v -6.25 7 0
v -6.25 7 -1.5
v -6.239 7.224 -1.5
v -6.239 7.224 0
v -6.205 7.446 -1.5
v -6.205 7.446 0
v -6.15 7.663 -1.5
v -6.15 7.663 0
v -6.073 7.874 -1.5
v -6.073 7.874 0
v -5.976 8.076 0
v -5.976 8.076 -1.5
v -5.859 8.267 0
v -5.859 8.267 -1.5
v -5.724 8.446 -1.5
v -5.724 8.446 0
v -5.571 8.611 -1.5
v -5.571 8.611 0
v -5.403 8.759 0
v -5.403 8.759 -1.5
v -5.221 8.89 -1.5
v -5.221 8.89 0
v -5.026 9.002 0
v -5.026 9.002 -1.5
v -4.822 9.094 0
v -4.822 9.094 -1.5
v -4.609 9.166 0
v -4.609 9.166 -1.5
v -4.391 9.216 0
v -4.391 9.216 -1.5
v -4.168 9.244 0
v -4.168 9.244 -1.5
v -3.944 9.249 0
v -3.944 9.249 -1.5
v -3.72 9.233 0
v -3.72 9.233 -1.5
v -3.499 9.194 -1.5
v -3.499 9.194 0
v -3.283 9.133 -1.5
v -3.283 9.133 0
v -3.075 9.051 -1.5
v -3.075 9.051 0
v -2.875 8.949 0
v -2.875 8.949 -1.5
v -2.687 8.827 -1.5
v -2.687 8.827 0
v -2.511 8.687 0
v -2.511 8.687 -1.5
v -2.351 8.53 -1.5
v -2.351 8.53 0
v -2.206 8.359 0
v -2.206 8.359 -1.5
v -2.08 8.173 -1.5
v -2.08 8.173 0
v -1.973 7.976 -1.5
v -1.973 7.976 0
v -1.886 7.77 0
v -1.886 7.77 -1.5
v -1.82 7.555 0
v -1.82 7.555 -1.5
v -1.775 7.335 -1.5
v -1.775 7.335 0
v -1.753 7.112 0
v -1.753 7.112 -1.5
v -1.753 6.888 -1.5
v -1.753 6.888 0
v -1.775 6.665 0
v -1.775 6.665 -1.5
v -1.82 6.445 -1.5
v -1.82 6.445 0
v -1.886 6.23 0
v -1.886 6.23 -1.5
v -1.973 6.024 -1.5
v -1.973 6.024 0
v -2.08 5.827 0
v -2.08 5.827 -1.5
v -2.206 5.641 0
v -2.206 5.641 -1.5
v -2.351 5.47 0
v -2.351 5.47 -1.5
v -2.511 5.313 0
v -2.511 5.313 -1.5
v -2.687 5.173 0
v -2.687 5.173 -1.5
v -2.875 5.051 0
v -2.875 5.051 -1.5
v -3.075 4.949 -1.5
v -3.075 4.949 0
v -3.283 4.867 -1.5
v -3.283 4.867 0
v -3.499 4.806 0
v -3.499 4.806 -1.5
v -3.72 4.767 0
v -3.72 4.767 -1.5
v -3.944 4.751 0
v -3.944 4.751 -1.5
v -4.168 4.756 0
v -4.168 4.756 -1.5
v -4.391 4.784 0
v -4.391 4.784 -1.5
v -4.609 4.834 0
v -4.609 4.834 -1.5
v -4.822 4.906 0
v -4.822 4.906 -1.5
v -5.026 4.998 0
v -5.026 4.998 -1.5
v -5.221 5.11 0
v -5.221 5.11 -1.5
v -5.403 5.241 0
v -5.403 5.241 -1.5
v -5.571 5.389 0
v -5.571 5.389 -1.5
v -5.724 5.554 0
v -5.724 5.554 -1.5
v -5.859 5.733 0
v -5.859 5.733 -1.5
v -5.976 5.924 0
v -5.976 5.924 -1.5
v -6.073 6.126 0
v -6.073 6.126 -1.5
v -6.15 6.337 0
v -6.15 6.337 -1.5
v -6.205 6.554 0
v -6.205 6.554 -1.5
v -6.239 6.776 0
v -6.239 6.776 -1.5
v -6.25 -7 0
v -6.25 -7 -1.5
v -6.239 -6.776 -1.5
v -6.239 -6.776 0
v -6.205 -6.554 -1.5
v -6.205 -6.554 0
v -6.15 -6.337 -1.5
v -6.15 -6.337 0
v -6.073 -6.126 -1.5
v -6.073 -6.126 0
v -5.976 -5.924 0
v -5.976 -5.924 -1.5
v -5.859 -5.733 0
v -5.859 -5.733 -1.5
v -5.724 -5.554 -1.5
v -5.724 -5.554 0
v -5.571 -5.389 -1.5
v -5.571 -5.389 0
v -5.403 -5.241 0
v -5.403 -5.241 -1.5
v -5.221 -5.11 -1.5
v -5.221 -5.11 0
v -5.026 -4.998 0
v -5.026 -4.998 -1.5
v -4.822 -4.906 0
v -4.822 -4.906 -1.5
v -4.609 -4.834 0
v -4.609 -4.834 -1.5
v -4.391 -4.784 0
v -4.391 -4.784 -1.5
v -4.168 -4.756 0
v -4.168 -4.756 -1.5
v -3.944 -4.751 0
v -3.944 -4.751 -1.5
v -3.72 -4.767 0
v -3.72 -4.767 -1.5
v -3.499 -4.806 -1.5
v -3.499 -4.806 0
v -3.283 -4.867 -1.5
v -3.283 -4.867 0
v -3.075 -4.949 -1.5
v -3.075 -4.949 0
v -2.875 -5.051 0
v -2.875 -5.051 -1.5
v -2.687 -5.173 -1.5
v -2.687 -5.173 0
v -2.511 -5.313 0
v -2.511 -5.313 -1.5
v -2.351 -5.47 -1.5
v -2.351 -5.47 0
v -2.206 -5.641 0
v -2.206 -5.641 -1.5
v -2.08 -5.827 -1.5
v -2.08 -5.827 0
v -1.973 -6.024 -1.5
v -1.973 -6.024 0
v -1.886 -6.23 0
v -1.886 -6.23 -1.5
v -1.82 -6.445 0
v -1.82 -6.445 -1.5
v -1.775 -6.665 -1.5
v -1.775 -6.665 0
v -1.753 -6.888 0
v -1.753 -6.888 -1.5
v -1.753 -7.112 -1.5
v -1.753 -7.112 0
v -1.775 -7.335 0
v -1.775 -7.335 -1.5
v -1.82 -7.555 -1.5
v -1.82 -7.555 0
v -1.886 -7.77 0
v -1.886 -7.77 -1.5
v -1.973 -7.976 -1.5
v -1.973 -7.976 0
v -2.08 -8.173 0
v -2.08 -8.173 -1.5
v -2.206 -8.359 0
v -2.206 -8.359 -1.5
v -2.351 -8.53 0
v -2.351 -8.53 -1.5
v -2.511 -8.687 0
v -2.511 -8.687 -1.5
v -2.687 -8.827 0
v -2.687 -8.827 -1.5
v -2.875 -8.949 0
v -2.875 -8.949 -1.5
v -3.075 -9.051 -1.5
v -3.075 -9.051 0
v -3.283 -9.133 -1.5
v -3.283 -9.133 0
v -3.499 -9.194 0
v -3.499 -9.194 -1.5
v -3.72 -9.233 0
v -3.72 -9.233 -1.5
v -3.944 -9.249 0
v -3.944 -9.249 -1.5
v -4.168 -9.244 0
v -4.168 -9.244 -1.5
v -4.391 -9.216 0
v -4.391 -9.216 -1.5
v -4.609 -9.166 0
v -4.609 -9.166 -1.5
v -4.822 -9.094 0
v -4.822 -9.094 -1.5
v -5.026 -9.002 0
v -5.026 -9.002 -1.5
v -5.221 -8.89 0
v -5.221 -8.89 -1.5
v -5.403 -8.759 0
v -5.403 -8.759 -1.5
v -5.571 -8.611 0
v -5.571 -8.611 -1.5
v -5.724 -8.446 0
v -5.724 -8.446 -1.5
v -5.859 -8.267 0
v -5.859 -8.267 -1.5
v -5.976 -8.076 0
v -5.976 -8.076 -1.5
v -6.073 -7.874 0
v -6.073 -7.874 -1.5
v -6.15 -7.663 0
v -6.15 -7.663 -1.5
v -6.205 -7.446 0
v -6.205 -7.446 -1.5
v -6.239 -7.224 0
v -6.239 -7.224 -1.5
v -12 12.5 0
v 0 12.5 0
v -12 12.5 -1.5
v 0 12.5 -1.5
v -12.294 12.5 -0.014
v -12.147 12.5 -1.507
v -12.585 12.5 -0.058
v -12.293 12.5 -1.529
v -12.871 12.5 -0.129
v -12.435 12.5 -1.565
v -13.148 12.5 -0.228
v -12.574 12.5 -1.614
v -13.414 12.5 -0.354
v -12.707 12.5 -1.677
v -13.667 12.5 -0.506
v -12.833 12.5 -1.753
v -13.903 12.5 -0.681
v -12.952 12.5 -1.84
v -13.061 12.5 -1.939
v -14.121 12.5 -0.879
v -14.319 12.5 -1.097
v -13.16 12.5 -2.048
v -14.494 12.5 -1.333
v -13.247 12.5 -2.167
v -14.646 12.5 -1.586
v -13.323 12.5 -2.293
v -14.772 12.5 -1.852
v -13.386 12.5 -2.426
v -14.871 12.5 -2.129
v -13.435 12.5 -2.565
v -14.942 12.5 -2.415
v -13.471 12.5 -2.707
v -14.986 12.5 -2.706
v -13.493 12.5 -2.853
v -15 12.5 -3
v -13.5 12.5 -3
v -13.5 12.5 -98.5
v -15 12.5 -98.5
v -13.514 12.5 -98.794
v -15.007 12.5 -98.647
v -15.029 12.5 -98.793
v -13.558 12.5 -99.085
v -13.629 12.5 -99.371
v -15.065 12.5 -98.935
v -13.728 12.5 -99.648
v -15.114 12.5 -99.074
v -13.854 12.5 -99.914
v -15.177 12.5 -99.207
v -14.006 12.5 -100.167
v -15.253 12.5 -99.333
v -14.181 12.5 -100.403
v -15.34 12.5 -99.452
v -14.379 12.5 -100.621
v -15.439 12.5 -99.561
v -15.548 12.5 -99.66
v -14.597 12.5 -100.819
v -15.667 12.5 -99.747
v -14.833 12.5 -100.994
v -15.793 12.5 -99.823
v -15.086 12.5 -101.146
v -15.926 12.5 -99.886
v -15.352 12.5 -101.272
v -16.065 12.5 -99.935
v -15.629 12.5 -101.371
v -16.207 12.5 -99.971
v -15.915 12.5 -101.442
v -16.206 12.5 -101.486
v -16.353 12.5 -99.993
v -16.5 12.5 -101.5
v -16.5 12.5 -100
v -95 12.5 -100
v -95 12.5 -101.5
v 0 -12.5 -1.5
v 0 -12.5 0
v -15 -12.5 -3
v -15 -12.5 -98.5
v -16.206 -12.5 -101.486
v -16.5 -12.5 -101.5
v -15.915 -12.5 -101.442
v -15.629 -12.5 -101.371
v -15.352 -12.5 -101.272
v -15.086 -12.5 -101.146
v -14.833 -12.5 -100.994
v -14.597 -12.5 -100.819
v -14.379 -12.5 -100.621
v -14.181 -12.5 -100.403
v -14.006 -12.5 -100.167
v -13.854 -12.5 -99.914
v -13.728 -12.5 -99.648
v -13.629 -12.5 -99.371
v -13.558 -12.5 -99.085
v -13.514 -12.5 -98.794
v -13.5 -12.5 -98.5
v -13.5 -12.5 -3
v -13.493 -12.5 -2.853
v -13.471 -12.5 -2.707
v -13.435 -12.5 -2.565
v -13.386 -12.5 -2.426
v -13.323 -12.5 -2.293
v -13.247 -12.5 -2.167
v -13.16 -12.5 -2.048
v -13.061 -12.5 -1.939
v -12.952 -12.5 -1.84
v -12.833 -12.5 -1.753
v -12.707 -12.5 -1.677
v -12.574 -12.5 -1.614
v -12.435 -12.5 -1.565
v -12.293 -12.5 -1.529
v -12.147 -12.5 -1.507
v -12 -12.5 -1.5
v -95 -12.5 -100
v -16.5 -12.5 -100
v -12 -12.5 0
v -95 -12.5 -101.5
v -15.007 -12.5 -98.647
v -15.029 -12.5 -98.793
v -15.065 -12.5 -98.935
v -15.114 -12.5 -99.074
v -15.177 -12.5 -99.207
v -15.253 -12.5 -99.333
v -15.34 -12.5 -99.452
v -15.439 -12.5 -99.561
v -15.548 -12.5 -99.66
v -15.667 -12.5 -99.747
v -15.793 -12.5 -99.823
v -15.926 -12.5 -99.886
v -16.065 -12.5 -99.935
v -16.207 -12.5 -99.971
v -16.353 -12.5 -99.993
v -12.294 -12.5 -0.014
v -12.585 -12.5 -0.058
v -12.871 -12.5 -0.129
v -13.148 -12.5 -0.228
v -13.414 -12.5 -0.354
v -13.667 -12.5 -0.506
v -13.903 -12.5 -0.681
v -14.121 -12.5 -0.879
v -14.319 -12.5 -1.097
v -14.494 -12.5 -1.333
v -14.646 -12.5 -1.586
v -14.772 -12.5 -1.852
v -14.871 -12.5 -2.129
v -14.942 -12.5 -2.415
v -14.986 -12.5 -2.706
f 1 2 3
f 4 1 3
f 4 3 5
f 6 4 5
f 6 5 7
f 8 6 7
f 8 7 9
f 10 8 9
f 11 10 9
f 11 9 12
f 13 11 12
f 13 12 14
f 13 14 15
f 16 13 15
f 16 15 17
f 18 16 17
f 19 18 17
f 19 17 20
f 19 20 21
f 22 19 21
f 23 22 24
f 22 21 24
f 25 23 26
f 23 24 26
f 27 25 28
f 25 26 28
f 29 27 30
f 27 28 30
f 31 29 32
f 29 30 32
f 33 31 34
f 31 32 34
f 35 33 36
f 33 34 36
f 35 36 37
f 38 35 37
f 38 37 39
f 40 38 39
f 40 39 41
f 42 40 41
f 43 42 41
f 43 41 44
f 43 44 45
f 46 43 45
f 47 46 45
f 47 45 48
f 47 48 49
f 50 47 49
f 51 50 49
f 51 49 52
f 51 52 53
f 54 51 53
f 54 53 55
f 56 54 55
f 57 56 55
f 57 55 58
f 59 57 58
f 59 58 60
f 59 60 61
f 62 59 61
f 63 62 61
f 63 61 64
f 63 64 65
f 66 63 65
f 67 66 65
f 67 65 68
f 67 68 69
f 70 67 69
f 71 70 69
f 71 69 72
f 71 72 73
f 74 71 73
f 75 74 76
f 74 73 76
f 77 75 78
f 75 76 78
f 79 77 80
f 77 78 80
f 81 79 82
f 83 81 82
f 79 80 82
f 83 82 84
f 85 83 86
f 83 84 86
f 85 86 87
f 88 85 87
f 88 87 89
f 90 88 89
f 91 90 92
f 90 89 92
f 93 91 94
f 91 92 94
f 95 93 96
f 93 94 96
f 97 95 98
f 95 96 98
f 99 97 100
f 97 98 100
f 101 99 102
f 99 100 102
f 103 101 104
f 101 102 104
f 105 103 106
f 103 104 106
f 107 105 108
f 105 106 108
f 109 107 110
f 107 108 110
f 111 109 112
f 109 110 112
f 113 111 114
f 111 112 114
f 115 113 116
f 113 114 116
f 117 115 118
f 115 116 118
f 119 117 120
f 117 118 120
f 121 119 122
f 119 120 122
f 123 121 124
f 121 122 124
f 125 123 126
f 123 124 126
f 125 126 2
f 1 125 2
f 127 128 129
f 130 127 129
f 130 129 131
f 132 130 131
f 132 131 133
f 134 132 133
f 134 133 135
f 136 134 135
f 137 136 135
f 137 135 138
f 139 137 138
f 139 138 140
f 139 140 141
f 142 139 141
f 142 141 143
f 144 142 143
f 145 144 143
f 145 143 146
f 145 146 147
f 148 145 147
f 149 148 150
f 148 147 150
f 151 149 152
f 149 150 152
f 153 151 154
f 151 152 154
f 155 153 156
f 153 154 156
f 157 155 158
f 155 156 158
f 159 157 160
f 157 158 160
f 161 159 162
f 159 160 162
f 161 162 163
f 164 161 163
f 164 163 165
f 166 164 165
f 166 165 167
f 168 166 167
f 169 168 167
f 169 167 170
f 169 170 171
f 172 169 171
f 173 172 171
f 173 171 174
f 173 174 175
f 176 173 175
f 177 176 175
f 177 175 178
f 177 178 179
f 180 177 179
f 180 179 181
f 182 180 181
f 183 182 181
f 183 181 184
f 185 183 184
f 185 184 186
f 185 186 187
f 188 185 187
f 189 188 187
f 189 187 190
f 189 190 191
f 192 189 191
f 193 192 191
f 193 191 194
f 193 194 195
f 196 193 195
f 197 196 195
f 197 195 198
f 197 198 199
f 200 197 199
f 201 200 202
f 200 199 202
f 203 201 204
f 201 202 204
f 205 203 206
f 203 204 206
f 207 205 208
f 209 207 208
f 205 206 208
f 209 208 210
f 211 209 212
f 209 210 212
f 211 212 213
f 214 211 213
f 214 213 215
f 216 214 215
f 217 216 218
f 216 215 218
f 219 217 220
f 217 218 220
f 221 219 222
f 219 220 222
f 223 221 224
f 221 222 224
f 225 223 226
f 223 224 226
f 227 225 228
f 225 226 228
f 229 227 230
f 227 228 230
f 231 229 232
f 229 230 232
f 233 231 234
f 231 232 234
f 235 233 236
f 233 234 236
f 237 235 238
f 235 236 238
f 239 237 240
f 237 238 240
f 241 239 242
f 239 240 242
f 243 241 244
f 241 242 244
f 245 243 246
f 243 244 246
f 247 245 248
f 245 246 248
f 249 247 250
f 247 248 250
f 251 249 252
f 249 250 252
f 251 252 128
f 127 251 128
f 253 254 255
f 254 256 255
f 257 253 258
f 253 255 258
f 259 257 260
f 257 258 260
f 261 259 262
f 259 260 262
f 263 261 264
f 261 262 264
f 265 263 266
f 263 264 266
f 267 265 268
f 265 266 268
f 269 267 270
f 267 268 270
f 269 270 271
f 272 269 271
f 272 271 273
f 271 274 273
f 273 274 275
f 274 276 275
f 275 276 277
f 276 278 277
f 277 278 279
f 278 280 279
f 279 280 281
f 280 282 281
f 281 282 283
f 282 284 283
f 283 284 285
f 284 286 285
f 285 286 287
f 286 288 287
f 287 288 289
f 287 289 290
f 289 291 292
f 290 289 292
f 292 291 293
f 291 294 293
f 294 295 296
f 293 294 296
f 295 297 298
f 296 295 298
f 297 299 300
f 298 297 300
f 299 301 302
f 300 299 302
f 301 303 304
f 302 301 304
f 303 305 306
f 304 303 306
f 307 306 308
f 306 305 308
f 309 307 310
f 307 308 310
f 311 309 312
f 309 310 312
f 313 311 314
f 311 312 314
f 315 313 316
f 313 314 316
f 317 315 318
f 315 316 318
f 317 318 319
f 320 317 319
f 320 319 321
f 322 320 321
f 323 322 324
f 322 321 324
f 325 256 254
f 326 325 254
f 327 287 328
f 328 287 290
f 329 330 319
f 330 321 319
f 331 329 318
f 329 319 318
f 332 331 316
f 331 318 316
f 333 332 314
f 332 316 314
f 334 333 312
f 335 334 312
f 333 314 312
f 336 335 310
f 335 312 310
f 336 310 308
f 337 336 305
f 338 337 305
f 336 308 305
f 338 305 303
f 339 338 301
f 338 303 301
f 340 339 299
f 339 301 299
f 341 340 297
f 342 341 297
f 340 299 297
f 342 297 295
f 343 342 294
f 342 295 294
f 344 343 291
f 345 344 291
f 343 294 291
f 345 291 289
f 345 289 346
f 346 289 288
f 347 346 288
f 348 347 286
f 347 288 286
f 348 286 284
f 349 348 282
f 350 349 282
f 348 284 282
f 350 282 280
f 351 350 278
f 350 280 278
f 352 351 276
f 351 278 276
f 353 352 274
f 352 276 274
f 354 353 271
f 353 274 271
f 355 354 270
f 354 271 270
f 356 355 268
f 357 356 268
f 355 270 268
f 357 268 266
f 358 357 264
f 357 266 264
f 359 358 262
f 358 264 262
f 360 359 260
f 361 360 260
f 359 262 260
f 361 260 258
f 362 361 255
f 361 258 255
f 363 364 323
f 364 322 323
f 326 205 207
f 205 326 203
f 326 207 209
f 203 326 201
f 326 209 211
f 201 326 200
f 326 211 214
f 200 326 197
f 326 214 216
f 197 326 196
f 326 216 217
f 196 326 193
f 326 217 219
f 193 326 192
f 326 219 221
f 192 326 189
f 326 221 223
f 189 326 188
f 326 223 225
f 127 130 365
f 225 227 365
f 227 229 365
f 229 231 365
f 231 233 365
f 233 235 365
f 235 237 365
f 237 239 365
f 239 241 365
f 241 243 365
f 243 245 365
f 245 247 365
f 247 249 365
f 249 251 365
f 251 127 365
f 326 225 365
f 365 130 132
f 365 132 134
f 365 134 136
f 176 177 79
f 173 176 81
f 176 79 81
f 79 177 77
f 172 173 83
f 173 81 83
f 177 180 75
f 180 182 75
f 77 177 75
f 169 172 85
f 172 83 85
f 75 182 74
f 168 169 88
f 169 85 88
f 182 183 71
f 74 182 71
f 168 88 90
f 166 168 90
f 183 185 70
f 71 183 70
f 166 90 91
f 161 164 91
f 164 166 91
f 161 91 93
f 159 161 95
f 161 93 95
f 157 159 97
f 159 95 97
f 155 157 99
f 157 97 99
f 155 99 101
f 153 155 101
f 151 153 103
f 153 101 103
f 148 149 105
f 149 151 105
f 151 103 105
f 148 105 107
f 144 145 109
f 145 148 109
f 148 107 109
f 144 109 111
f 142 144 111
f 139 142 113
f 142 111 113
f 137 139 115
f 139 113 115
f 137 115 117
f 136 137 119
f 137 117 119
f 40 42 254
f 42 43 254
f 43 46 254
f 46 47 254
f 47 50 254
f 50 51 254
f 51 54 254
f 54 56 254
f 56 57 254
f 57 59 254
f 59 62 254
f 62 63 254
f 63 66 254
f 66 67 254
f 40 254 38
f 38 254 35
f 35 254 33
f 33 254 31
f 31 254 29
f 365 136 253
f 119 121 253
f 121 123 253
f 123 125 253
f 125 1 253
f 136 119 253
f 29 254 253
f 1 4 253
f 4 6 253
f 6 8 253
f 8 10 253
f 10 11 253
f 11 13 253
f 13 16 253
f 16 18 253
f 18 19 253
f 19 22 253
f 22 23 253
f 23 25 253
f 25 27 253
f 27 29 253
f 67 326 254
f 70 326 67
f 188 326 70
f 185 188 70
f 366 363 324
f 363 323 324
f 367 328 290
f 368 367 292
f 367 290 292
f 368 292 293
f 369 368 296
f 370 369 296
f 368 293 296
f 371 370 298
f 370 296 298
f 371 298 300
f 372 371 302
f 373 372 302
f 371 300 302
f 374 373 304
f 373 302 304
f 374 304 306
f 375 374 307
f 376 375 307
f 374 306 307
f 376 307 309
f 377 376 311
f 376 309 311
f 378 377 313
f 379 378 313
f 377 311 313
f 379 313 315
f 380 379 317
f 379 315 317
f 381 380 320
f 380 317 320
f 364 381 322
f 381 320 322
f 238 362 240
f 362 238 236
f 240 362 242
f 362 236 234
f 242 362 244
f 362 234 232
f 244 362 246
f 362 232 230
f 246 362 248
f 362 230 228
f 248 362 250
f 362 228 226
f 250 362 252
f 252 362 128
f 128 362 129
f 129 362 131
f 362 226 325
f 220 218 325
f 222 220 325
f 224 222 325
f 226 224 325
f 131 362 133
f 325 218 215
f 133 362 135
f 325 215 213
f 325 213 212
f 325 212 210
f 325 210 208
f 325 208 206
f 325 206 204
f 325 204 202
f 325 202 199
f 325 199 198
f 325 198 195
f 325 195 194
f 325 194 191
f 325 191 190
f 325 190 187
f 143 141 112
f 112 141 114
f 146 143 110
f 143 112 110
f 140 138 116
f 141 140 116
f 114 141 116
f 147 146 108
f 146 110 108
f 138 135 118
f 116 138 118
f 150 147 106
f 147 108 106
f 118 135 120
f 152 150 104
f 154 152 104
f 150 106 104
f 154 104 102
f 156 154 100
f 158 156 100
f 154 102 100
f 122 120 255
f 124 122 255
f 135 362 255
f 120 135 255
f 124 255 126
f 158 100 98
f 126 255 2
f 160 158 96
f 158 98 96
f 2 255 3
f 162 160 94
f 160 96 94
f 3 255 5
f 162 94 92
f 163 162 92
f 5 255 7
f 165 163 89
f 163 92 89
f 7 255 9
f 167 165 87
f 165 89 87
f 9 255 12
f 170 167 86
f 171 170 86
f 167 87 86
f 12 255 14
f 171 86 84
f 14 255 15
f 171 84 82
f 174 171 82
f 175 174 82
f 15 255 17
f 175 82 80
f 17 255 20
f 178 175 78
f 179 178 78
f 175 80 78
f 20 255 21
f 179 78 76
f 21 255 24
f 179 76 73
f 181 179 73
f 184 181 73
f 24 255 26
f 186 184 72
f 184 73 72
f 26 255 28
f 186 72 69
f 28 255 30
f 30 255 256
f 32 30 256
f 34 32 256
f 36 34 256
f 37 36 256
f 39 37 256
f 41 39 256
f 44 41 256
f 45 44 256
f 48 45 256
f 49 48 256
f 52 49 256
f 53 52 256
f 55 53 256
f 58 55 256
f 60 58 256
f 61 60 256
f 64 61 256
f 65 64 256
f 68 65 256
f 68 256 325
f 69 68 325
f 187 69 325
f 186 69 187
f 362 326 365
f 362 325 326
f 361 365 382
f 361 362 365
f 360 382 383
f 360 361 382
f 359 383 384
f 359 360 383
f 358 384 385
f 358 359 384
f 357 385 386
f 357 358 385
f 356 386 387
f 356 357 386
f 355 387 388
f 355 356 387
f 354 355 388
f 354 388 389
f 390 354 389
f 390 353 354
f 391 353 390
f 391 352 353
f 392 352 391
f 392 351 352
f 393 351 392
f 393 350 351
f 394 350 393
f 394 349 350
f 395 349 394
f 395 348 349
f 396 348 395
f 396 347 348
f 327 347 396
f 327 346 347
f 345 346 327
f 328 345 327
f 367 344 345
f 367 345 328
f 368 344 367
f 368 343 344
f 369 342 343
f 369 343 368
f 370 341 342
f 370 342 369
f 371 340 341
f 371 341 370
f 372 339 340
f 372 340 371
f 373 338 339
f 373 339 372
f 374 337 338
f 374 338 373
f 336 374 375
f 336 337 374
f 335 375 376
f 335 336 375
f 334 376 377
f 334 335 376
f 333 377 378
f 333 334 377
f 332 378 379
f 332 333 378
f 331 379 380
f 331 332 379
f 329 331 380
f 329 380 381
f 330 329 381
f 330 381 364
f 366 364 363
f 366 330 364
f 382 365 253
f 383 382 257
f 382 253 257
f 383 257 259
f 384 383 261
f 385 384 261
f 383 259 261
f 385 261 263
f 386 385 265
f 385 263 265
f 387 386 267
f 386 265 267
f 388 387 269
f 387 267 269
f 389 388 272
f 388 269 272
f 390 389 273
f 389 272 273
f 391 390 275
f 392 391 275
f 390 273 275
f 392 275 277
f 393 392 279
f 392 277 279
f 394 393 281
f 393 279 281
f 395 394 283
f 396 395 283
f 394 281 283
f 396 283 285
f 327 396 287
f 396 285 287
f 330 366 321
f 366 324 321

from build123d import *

# Parameters (mm, degrees)
BASE_FLANGE1_DEPTH   = 12.5
M4_CLEARANCE_HOLE1_D = 4.5


# Sheet-metal steps are written as plain solids
with BuildPart() as part:
    # Sketch1 → Base-Flange1 (new, symmetric)
    with BuildSketch(Plane(origin=(0, 0, 0), x_dir=(1, 0, 0), z_dir=(0, 1, 0))):
        with BuildLine():
            Line((0, 0), (-12, 0))
            ThreePointArc((-12, 0), (-14.121320344, 0.878679656), (-15, 3))
            Line((-15, 3), (-15, 98.5))
            ThreePointArc((-15, 98.5), (-15.439339828, 99.560660172), (-16.5, 100))
            Line((-16.5, 100), (-95, 100))
            Line((-95, 100), (-95, 101.5))
            Line((-95, 101.5), (-16.5, 101.5))
            ThreePointArc((-16.5, 101.5), (-14.378679656, 100.621320344), (-13.5, 98.5))
            Line((-13.5, 98.5), (-13.5, 3))
            ThreePointArc((-13.5, 3), (-13.060660172, 1.939339828), (-12, 1.5))
            Line((-12, 1.5), (0, 1.5))
            Line((0, 1.5), (0, 0))
        make_face()
    extrude(amount=BASE_FLANGE1_DEPTH, both=True)

    # M4 Clearance Hole1 (through all)
    with Locations(Plane.XY):
        with Locations((-4, 7), (-4, -7)):
            Hole(M4_CLEARANCE_HOLE1_D / 2)


solid = part.part
